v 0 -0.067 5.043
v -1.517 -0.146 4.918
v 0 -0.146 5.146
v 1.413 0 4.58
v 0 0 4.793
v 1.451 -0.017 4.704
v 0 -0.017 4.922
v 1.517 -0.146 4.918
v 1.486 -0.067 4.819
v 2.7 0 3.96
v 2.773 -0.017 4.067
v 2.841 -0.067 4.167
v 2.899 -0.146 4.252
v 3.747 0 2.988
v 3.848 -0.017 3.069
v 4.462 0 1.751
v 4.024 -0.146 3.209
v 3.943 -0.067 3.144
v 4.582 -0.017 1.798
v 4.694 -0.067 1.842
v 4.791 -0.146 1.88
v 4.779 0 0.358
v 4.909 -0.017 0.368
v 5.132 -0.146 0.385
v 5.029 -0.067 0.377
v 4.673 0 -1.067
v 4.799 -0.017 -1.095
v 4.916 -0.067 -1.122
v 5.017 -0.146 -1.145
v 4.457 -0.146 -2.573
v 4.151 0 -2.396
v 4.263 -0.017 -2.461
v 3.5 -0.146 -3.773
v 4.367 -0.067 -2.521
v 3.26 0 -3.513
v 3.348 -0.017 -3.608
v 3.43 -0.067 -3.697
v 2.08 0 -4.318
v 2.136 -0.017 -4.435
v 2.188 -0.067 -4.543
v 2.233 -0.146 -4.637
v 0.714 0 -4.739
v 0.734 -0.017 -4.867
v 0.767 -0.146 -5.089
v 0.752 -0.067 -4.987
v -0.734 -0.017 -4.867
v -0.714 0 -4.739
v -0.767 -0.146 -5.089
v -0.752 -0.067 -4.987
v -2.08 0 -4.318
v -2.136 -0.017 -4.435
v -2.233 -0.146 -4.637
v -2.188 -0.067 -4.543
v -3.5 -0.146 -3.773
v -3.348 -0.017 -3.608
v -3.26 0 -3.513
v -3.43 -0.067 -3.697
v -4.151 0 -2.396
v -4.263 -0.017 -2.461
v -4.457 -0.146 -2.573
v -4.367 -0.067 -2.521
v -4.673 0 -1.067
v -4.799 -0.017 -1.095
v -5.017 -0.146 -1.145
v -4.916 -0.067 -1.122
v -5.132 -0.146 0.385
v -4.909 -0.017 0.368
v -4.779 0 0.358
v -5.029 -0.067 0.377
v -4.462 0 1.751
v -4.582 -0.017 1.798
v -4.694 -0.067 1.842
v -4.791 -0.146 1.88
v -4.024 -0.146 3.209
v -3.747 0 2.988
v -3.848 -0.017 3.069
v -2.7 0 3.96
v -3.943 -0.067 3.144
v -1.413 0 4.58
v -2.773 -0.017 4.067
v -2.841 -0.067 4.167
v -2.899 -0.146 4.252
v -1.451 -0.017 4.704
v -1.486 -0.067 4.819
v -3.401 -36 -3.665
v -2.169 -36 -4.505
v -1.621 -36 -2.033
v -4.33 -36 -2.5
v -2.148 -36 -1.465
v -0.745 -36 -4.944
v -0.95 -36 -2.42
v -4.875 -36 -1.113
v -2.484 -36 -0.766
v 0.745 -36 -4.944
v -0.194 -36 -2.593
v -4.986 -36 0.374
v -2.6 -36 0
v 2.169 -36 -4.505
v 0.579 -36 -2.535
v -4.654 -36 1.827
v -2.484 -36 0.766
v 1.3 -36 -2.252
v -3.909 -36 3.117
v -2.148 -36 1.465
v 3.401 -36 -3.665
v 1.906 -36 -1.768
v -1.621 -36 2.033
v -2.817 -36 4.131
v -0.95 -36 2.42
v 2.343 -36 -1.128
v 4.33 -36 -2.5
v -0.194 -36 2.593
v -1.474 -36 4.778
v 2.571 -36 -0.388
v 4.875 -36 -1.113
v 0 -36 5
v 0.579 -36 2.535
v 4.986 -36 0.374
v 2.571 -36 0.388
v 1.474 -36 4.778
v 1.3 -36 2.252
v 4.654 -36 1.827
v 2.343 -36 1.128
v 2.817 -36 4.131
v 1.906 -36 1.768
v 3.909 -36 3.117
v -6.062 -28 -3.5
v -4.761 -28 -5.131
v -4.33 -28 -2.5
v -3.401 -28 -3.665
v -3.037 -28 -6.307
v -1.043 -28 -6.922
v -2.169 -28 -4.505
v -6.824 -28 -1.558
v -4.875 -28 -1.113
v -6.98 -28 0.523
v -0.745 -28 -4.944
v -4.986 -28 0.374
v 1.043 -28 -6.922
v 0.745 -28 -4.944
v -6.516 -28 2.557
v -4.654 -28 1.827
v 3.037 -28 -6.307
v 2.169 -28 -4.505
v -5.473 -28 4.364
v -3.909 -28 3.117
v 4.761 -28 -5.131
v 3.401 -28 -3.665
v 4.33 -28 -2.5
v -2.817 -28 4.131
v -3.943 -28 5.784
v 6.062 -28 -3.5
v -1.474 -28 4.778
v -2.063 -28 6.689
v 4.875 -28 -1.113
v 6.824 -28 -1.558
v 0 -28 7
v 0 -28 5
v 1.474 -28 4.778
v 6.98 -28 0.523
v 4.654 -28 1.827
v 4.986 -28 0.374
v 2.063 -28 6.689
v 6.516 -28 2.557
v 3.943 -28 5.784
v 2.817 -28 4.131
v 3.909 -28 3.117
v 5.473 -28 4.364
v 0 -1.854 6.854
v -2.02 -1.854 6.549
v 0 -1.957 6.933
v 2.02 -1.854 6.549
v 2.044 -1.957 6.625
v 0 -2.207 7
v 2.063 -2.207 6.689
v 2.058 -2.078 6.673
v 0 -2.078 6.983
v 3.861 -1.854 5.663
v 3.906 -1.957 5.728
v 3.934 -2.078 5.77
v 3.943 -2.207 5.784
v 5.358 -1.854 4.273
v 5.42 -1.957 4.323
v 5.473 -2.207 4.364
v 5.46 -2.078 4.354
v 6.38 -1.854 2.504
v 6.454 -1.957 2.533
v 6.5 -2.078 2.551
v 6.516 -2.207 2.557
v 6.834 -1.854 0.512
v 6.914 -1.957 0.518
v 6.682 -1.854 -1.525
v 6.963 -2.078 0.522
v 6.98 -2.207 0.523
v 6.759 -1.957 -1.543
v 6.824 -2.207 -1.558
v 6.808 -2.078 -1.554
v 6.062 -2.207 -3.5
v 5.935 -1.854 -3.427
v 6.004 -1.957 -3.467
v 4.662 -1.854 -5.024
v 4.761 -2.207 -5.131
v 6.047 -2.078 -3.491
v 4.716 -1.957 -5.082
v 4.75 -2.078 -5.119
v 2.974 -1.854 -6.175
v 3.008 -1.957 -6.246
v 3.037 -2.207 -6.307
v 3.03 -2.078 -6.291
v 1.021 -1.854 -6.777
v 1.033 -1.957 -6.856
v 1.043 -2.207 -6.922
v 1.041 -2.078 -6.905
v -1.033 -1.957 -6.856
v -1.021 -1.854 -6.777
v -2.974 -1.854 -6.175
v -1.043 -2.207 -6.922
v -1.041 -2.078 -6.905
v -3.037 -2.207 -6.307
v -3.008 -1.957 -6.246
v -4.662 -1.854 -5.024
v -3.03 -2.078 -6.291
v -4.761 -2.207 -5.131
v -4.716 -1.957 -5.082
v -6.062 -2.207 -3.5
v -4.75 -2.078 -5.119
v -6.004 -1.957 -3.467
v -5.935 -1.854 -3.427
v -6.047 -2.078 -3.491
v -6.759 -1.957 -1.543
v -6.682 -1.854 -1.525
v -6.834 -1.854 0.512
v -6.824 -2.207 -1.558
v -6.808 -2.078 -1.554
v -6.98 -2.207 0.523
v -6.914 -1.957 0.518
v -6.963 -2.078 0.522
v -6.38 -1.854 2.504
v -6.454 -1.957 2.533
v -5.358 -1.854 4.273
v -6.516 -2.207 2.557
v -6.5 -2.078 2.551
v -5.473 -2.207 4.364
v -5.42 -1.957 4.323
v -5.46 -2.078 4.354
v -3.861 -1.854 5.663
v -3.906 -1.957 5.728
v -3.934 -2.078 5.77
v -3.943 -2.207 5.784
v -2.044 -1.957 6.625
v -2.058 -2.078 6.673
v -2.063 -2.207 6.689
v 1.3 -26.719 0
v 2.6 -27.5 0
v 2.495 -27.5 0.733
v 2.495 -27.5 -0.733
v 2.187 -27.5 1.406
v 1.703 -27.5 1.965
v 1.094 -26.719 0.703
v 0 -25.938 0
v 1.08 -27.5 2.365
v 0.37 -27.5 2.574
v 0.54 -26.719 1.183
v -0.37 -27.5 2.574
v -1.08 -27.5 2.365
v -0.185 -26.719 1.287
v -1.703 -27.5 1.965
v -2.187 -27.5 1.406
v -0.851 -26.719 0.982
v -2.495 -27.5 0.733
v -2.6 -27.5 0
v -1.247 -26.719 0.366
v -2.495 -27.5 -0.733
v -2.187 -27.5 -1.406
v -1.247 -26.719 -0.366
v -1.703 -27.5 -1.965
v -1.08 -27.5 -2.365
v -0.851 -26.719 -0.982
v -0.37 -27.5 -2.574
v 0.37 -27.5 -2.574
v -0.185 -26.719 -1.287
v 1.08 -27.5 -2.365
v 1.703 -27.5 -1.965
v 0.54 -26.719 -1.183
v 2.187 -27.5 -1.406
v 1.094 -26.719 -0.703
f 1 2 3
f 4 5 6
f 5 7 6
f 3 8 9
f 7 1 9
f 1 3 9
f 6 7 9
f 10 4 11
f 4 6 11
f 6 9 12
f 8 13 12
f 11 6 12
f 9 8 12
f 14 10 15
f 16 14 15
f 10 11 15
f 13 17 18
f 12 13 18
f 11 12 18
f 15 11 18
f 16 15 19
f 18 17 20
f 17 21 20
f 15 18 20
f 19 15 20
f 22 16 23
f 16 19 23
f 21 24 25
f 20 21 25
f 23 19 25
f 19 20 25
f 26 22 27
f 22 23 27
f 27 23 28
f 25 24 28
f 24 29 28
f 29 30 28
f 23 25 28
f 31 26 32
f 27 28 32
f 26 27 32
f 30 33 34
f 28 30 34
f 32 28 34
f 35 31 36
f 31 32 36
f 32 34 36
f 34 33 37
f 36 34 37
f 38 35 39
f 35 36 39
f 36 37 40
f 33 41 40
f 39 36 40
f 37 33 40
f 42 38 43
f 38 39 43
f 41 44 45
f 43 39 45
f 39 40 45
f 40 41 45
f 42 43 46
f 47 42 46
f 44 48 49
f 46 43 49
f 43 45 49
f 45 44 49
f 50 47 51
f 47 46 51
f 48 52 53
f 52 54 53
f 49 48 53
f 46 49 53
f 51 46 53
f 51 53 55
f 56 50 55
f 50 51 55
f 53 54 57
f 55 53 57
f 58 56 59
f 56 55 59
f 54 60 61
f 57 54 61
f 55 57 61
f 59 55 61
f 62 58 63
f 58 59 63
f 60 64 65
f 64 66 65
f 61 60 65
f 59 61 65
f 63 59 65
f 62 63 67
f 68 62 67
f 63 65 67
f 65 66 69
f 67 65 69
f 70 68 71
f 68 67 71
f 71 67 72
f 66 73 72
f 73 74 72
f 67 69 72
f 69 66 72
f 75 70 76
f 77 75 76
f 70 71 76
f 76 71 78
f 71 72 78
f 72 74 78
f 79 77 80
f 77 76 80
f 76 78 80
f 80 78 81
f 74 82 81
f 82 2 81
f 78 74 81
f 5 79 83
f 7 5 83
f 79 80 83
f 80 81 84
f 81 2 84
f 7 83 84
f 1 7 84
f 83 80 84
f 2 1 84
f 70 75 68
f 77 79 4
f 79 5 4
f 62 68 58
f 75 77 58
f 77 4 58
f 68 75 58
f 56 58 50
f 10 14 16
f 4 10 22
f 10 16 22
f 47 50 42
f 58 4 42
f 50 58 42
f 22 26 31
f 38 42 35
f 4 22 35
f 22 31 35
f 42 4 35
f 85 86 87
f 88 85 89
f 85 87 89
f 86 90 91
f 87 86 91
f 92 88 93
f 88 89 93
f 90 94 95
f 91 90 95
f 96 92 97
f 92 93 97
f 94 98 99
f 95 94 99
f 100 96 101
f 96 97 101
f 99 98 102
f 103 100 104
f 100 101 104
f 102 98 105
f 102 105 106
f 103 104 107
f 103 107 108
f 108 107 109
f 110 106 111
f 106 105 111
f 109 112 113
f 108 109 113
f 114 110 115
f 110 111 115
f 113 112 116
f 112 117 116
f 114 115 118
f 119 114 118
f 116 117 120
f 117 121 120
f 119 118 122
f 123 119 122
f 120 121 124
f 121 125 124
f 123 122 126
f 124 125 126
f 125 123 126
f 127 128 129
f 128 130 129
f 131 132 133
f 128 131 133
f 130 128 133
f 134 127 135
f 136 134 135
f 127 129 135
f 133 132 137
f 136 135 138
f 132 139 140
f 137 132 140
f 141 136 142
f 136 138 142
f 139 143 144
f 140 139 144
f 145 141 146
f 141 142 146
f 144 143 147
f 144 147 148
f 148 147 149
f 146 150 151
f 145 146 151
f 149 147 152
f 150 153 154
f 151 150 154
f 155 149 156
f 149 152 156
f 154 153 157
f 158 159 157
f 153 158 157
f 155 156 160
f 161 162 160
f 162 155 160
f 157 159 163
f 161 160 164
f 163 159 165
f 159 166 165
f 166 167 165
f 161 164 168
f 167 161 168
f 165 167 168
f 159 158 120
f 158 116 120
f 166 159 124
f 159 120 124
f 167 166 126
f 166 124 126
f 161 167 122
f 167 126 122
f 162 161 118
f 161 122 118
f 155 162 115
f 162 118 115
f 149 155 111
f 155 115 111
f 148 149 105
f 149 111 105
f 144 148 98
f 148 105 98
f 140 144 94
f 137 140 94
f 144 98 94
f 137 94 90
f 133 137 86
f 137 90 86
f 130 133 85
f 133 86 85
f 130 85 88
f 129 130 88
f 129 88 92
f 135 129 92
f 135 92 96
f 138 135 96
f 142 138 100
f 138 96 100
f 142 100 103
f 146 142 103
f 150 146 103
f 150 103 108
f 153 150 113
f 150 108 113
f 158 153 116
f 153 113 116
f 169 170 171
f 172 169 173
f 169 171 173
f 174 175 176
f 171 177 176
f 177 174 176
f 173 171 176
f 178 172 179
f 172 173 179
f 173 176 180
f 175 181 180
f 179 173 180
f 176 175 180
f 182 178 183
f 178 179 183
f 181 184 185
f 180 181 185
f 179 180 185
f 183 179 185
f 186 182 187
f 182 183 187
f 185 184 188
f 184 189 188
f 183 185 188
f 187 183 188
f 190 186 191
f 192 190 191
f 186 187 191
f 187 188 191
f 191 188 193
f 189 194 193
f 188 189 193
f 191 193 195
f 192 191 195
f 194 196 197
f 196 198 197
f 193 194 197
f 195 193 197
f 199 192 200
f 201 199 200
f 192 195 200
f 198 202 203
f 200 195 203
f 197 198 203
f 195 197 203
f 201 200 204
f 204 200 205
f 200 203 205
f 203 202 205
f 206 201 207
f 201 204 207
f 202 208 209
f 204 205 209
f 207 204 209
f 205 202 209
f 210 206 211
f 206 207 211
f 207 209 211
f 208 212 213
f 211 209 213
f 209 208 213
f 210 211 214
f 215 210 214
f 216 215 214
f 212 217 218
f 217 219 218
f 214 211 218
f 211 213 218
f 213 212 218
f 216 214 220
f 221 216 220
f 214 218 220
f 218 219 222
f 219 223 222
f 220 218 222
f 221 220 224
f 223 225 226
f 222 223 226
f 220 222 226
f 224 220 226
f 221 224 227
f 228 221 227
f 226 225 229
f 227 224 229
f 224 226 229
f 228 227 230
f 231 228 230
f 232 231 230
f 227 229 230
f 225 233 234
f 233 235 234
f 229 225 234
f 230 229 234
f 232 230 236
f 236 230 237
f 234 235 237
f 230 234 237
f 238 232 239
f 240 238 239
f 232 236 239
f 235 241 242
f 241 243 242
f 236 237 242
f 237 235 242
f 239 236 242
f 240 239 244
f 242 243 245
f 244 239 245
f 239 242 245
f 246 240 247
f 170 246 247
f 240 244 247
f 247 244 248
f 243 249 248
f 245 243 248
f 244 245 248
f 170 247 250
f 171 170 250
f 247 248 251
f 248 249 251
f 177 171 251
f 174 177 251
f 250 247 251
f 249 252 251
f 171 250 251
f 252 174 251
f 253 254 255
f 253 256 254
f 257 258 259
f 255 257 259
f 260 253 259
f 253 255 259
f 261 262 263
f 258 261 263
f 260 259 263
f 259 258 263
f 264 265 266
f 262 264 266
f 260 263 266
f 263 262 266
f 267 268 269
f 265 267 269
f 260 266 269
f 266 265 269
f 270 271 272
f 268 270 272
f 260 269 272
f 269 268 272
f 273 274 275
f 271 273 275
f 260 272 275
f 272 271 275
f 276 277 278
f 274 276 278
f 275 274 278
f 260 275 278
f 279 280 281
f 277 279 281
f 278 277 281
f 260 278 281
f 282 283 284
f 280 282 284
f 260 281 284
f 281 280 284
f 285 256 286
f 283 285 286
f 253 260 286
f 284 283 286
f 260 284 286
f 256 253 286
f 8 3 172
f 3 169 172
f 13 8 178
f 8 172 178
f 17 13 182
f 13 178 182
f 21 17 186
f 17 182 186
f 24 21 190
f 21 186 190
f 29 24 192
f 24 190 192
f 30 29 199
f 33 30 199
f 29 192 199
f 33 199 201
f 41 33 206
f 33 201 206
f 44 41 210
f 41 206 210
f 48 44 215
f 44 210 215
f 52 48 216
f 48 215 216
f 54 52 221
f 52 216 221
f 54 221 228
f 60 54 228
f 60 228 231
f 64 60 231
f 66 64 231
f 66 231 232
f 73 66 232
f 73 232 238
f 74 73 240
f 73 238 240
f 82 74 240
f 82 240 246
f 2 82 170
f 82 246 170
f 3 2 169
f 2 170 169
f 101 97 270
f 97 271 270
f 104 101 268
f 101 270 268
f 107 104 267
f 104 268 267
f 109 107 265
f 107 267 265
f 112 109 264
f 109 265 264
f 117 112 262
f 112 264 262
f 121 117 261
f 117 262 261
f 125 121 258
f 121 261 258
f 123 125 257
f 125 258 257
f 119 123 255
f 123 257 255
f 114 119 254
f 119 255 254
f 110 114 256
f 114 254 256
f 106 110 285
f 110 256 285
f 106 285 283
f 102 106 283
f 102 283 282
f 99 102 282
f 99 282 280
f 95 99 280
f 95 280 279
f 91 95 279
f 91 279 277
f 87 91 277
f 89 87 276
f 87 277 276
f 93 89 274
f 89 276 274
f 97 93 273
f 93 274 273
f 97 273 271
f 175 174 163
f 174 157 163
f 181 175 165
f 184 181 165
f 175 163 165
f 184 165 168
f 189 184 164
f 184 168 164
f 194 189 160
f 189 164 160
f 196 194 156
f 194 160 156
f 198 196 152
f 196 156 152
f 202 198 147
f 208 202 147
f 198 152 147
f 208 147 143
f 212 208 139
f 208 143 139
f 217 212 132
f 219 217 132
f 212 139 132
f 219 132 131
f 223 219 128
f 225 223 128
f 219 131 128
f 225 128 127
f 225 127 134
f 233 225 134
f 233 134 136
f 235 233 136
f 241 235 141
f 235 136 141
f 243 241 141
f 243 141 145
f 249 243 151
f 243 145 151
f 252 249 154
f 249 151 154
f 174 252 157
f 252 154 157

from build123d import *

# Parameters (mm, degrees)
F3_D     = 5.2
F3_DEPTH = 8.5
F3_TIP   = 1.5622376095


with BuildPart() as f1:
    # F0 (on Right) → F1 (revolve)
    with BuildSketch(Plane.YZ):
        with BuildLine():
            Line((-36, 5), (-36, 0))
            Line((-36, 0), (0, 0))
            Line((0, 0), (0, 4.7928932188))
            ThreePointArc((0, 4.7928932188), (-0.0380602337, 4.984234935), (-0.1464466094, 5.1464466094))
            Line((-0.1464466094, 5.1464466094), (-1.8535533906, 6.8535533906))
            ThreePointArc((-1.8535533906, 6.8535533906), (-2.015765065, 6.9619397663), (-2.2071067812, 7))
            Line((-2.2071067812, 7), (-28, 7))
            Line((-28, 7), (-28, 5))
            Line((-28, 5), (-36, 5))
        make_face()
    revolve(axis=Axis((0, -18, 0), (0, 1, 0)))

    # F3
    with Locations(Plane.XZ.offset(36)):
        with Locations((0, 0)):
            Hole(F3_D / 2, depth=F3_DEPTH)
            with Locations((0, 0, -(F3_DEPTH + F3_TIP / 2))):  # 118° drill point
                Cone(0, F3_D / 2, F3_TIP, mode=Mode.SUBTRACT)


solid = f1.part
